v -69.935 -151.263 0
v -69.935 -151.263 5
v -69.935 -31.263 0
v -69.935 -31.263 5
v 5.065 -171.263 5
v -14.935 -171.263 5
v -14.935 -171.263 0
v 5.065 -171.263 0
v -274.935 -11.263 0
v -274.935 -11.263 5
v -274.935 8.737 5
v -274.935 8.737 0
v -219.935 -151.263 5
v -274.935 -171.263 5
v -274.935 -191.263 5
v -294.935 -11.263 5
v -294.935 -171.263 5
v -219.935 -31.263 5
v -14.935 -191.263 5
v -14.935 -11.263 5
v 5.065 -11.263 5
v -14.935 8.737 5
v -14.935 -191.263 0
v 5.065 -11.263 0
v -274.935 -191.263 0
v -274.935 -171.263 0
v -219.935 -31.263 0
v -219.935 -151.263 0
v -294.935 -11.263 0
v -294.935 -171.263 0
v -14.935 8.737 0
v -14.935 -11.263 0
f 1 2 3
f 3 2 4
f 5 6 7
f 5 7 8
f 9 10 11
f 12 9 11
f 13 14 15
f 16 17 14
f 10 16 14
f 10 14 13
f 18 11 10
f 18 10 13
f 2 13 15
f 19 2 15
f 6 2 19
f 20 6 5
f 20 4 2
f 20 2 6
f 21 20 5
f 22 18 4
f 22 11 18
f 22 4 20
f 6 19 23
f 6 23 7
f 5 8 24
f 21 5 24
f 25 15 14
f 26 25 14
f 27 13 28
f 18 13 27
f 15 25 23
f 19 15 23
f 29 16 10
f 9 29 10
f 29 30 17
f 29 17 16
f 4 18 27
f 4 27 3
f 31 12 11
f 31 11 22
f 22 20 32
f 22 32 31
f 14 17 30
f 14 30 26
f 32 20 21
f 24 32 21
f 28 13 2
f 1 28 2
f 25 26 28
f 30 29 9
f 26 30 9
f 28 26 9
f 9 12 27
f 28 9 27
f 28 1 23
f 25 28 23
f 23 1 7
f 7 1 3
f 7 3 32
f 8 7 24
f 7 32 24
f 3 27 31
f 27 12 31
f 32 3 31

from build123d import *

# Parameters (mm, degrees)
CROQUIS1_W              = 300
CROQUIS1_H              = 200
SALIENTE_EXTRUIR1_DEPTH = 5
CROQUIS4_W              = 20
CROQUIS4_H              = 20
CORTAR_EXTRUIR4_DEPTH   = 10
CROQUIS5_W              = 150
CROQUIS5_H              = 120
CORTAR_EXTRUIR6_DEPTH   = 10


with BuildPart() as part:
    # Croquis1 → Saliente-Extruir1 (new body)
    with BuildSketch(Plane.XY):
        with Locations((-144.934554974, -91.263089005)):
            Rectangle(CROQUIS1_W, CROQUIS1_H)
    extrude(amount=SALIENTE_EXTRUIR1_DEPTH)

    # Croquis4 → Cortar-Extruir4 (cut)
    with BuildSketch(Plane.XY.offset(5)):
        with Locations((-284.934554974, -1.263089005)):
            Rectangle(CROQUIS4_W, CROQUIS4_H)
        with Locations((-4.934554974, -1.263089005)):
            Rectangle(CROQUIS4_W, CROQUIS4_H)
        with Locations((-284.934554974, -181.263089005)):
            Rectangle(CROQUIS4_W, CROQUIS4_H)
        with Locations((-4.934554974, -181.263089005)):
            Rectangle(CROQUIS4_W, CROQUIS4_H)
    extrude(amount=-CORTAR_EXTRUIR4_DEPTH, mode=Mode.SUBTRACT)

    # Croquis5 → Cortar-Extruir6 (cut)
    with BuildSketch(Plane.XY.offset(5)):
        with Locations((-144.934554974, -91.263089005)):
            Rectangle(CROQUIS5_W, CROQUIS5_H)
    extrude(amount=-CORTAR_EXTRUIR6_DEPTH, mode=Mode.SUBTRACT)


solid = part.part
